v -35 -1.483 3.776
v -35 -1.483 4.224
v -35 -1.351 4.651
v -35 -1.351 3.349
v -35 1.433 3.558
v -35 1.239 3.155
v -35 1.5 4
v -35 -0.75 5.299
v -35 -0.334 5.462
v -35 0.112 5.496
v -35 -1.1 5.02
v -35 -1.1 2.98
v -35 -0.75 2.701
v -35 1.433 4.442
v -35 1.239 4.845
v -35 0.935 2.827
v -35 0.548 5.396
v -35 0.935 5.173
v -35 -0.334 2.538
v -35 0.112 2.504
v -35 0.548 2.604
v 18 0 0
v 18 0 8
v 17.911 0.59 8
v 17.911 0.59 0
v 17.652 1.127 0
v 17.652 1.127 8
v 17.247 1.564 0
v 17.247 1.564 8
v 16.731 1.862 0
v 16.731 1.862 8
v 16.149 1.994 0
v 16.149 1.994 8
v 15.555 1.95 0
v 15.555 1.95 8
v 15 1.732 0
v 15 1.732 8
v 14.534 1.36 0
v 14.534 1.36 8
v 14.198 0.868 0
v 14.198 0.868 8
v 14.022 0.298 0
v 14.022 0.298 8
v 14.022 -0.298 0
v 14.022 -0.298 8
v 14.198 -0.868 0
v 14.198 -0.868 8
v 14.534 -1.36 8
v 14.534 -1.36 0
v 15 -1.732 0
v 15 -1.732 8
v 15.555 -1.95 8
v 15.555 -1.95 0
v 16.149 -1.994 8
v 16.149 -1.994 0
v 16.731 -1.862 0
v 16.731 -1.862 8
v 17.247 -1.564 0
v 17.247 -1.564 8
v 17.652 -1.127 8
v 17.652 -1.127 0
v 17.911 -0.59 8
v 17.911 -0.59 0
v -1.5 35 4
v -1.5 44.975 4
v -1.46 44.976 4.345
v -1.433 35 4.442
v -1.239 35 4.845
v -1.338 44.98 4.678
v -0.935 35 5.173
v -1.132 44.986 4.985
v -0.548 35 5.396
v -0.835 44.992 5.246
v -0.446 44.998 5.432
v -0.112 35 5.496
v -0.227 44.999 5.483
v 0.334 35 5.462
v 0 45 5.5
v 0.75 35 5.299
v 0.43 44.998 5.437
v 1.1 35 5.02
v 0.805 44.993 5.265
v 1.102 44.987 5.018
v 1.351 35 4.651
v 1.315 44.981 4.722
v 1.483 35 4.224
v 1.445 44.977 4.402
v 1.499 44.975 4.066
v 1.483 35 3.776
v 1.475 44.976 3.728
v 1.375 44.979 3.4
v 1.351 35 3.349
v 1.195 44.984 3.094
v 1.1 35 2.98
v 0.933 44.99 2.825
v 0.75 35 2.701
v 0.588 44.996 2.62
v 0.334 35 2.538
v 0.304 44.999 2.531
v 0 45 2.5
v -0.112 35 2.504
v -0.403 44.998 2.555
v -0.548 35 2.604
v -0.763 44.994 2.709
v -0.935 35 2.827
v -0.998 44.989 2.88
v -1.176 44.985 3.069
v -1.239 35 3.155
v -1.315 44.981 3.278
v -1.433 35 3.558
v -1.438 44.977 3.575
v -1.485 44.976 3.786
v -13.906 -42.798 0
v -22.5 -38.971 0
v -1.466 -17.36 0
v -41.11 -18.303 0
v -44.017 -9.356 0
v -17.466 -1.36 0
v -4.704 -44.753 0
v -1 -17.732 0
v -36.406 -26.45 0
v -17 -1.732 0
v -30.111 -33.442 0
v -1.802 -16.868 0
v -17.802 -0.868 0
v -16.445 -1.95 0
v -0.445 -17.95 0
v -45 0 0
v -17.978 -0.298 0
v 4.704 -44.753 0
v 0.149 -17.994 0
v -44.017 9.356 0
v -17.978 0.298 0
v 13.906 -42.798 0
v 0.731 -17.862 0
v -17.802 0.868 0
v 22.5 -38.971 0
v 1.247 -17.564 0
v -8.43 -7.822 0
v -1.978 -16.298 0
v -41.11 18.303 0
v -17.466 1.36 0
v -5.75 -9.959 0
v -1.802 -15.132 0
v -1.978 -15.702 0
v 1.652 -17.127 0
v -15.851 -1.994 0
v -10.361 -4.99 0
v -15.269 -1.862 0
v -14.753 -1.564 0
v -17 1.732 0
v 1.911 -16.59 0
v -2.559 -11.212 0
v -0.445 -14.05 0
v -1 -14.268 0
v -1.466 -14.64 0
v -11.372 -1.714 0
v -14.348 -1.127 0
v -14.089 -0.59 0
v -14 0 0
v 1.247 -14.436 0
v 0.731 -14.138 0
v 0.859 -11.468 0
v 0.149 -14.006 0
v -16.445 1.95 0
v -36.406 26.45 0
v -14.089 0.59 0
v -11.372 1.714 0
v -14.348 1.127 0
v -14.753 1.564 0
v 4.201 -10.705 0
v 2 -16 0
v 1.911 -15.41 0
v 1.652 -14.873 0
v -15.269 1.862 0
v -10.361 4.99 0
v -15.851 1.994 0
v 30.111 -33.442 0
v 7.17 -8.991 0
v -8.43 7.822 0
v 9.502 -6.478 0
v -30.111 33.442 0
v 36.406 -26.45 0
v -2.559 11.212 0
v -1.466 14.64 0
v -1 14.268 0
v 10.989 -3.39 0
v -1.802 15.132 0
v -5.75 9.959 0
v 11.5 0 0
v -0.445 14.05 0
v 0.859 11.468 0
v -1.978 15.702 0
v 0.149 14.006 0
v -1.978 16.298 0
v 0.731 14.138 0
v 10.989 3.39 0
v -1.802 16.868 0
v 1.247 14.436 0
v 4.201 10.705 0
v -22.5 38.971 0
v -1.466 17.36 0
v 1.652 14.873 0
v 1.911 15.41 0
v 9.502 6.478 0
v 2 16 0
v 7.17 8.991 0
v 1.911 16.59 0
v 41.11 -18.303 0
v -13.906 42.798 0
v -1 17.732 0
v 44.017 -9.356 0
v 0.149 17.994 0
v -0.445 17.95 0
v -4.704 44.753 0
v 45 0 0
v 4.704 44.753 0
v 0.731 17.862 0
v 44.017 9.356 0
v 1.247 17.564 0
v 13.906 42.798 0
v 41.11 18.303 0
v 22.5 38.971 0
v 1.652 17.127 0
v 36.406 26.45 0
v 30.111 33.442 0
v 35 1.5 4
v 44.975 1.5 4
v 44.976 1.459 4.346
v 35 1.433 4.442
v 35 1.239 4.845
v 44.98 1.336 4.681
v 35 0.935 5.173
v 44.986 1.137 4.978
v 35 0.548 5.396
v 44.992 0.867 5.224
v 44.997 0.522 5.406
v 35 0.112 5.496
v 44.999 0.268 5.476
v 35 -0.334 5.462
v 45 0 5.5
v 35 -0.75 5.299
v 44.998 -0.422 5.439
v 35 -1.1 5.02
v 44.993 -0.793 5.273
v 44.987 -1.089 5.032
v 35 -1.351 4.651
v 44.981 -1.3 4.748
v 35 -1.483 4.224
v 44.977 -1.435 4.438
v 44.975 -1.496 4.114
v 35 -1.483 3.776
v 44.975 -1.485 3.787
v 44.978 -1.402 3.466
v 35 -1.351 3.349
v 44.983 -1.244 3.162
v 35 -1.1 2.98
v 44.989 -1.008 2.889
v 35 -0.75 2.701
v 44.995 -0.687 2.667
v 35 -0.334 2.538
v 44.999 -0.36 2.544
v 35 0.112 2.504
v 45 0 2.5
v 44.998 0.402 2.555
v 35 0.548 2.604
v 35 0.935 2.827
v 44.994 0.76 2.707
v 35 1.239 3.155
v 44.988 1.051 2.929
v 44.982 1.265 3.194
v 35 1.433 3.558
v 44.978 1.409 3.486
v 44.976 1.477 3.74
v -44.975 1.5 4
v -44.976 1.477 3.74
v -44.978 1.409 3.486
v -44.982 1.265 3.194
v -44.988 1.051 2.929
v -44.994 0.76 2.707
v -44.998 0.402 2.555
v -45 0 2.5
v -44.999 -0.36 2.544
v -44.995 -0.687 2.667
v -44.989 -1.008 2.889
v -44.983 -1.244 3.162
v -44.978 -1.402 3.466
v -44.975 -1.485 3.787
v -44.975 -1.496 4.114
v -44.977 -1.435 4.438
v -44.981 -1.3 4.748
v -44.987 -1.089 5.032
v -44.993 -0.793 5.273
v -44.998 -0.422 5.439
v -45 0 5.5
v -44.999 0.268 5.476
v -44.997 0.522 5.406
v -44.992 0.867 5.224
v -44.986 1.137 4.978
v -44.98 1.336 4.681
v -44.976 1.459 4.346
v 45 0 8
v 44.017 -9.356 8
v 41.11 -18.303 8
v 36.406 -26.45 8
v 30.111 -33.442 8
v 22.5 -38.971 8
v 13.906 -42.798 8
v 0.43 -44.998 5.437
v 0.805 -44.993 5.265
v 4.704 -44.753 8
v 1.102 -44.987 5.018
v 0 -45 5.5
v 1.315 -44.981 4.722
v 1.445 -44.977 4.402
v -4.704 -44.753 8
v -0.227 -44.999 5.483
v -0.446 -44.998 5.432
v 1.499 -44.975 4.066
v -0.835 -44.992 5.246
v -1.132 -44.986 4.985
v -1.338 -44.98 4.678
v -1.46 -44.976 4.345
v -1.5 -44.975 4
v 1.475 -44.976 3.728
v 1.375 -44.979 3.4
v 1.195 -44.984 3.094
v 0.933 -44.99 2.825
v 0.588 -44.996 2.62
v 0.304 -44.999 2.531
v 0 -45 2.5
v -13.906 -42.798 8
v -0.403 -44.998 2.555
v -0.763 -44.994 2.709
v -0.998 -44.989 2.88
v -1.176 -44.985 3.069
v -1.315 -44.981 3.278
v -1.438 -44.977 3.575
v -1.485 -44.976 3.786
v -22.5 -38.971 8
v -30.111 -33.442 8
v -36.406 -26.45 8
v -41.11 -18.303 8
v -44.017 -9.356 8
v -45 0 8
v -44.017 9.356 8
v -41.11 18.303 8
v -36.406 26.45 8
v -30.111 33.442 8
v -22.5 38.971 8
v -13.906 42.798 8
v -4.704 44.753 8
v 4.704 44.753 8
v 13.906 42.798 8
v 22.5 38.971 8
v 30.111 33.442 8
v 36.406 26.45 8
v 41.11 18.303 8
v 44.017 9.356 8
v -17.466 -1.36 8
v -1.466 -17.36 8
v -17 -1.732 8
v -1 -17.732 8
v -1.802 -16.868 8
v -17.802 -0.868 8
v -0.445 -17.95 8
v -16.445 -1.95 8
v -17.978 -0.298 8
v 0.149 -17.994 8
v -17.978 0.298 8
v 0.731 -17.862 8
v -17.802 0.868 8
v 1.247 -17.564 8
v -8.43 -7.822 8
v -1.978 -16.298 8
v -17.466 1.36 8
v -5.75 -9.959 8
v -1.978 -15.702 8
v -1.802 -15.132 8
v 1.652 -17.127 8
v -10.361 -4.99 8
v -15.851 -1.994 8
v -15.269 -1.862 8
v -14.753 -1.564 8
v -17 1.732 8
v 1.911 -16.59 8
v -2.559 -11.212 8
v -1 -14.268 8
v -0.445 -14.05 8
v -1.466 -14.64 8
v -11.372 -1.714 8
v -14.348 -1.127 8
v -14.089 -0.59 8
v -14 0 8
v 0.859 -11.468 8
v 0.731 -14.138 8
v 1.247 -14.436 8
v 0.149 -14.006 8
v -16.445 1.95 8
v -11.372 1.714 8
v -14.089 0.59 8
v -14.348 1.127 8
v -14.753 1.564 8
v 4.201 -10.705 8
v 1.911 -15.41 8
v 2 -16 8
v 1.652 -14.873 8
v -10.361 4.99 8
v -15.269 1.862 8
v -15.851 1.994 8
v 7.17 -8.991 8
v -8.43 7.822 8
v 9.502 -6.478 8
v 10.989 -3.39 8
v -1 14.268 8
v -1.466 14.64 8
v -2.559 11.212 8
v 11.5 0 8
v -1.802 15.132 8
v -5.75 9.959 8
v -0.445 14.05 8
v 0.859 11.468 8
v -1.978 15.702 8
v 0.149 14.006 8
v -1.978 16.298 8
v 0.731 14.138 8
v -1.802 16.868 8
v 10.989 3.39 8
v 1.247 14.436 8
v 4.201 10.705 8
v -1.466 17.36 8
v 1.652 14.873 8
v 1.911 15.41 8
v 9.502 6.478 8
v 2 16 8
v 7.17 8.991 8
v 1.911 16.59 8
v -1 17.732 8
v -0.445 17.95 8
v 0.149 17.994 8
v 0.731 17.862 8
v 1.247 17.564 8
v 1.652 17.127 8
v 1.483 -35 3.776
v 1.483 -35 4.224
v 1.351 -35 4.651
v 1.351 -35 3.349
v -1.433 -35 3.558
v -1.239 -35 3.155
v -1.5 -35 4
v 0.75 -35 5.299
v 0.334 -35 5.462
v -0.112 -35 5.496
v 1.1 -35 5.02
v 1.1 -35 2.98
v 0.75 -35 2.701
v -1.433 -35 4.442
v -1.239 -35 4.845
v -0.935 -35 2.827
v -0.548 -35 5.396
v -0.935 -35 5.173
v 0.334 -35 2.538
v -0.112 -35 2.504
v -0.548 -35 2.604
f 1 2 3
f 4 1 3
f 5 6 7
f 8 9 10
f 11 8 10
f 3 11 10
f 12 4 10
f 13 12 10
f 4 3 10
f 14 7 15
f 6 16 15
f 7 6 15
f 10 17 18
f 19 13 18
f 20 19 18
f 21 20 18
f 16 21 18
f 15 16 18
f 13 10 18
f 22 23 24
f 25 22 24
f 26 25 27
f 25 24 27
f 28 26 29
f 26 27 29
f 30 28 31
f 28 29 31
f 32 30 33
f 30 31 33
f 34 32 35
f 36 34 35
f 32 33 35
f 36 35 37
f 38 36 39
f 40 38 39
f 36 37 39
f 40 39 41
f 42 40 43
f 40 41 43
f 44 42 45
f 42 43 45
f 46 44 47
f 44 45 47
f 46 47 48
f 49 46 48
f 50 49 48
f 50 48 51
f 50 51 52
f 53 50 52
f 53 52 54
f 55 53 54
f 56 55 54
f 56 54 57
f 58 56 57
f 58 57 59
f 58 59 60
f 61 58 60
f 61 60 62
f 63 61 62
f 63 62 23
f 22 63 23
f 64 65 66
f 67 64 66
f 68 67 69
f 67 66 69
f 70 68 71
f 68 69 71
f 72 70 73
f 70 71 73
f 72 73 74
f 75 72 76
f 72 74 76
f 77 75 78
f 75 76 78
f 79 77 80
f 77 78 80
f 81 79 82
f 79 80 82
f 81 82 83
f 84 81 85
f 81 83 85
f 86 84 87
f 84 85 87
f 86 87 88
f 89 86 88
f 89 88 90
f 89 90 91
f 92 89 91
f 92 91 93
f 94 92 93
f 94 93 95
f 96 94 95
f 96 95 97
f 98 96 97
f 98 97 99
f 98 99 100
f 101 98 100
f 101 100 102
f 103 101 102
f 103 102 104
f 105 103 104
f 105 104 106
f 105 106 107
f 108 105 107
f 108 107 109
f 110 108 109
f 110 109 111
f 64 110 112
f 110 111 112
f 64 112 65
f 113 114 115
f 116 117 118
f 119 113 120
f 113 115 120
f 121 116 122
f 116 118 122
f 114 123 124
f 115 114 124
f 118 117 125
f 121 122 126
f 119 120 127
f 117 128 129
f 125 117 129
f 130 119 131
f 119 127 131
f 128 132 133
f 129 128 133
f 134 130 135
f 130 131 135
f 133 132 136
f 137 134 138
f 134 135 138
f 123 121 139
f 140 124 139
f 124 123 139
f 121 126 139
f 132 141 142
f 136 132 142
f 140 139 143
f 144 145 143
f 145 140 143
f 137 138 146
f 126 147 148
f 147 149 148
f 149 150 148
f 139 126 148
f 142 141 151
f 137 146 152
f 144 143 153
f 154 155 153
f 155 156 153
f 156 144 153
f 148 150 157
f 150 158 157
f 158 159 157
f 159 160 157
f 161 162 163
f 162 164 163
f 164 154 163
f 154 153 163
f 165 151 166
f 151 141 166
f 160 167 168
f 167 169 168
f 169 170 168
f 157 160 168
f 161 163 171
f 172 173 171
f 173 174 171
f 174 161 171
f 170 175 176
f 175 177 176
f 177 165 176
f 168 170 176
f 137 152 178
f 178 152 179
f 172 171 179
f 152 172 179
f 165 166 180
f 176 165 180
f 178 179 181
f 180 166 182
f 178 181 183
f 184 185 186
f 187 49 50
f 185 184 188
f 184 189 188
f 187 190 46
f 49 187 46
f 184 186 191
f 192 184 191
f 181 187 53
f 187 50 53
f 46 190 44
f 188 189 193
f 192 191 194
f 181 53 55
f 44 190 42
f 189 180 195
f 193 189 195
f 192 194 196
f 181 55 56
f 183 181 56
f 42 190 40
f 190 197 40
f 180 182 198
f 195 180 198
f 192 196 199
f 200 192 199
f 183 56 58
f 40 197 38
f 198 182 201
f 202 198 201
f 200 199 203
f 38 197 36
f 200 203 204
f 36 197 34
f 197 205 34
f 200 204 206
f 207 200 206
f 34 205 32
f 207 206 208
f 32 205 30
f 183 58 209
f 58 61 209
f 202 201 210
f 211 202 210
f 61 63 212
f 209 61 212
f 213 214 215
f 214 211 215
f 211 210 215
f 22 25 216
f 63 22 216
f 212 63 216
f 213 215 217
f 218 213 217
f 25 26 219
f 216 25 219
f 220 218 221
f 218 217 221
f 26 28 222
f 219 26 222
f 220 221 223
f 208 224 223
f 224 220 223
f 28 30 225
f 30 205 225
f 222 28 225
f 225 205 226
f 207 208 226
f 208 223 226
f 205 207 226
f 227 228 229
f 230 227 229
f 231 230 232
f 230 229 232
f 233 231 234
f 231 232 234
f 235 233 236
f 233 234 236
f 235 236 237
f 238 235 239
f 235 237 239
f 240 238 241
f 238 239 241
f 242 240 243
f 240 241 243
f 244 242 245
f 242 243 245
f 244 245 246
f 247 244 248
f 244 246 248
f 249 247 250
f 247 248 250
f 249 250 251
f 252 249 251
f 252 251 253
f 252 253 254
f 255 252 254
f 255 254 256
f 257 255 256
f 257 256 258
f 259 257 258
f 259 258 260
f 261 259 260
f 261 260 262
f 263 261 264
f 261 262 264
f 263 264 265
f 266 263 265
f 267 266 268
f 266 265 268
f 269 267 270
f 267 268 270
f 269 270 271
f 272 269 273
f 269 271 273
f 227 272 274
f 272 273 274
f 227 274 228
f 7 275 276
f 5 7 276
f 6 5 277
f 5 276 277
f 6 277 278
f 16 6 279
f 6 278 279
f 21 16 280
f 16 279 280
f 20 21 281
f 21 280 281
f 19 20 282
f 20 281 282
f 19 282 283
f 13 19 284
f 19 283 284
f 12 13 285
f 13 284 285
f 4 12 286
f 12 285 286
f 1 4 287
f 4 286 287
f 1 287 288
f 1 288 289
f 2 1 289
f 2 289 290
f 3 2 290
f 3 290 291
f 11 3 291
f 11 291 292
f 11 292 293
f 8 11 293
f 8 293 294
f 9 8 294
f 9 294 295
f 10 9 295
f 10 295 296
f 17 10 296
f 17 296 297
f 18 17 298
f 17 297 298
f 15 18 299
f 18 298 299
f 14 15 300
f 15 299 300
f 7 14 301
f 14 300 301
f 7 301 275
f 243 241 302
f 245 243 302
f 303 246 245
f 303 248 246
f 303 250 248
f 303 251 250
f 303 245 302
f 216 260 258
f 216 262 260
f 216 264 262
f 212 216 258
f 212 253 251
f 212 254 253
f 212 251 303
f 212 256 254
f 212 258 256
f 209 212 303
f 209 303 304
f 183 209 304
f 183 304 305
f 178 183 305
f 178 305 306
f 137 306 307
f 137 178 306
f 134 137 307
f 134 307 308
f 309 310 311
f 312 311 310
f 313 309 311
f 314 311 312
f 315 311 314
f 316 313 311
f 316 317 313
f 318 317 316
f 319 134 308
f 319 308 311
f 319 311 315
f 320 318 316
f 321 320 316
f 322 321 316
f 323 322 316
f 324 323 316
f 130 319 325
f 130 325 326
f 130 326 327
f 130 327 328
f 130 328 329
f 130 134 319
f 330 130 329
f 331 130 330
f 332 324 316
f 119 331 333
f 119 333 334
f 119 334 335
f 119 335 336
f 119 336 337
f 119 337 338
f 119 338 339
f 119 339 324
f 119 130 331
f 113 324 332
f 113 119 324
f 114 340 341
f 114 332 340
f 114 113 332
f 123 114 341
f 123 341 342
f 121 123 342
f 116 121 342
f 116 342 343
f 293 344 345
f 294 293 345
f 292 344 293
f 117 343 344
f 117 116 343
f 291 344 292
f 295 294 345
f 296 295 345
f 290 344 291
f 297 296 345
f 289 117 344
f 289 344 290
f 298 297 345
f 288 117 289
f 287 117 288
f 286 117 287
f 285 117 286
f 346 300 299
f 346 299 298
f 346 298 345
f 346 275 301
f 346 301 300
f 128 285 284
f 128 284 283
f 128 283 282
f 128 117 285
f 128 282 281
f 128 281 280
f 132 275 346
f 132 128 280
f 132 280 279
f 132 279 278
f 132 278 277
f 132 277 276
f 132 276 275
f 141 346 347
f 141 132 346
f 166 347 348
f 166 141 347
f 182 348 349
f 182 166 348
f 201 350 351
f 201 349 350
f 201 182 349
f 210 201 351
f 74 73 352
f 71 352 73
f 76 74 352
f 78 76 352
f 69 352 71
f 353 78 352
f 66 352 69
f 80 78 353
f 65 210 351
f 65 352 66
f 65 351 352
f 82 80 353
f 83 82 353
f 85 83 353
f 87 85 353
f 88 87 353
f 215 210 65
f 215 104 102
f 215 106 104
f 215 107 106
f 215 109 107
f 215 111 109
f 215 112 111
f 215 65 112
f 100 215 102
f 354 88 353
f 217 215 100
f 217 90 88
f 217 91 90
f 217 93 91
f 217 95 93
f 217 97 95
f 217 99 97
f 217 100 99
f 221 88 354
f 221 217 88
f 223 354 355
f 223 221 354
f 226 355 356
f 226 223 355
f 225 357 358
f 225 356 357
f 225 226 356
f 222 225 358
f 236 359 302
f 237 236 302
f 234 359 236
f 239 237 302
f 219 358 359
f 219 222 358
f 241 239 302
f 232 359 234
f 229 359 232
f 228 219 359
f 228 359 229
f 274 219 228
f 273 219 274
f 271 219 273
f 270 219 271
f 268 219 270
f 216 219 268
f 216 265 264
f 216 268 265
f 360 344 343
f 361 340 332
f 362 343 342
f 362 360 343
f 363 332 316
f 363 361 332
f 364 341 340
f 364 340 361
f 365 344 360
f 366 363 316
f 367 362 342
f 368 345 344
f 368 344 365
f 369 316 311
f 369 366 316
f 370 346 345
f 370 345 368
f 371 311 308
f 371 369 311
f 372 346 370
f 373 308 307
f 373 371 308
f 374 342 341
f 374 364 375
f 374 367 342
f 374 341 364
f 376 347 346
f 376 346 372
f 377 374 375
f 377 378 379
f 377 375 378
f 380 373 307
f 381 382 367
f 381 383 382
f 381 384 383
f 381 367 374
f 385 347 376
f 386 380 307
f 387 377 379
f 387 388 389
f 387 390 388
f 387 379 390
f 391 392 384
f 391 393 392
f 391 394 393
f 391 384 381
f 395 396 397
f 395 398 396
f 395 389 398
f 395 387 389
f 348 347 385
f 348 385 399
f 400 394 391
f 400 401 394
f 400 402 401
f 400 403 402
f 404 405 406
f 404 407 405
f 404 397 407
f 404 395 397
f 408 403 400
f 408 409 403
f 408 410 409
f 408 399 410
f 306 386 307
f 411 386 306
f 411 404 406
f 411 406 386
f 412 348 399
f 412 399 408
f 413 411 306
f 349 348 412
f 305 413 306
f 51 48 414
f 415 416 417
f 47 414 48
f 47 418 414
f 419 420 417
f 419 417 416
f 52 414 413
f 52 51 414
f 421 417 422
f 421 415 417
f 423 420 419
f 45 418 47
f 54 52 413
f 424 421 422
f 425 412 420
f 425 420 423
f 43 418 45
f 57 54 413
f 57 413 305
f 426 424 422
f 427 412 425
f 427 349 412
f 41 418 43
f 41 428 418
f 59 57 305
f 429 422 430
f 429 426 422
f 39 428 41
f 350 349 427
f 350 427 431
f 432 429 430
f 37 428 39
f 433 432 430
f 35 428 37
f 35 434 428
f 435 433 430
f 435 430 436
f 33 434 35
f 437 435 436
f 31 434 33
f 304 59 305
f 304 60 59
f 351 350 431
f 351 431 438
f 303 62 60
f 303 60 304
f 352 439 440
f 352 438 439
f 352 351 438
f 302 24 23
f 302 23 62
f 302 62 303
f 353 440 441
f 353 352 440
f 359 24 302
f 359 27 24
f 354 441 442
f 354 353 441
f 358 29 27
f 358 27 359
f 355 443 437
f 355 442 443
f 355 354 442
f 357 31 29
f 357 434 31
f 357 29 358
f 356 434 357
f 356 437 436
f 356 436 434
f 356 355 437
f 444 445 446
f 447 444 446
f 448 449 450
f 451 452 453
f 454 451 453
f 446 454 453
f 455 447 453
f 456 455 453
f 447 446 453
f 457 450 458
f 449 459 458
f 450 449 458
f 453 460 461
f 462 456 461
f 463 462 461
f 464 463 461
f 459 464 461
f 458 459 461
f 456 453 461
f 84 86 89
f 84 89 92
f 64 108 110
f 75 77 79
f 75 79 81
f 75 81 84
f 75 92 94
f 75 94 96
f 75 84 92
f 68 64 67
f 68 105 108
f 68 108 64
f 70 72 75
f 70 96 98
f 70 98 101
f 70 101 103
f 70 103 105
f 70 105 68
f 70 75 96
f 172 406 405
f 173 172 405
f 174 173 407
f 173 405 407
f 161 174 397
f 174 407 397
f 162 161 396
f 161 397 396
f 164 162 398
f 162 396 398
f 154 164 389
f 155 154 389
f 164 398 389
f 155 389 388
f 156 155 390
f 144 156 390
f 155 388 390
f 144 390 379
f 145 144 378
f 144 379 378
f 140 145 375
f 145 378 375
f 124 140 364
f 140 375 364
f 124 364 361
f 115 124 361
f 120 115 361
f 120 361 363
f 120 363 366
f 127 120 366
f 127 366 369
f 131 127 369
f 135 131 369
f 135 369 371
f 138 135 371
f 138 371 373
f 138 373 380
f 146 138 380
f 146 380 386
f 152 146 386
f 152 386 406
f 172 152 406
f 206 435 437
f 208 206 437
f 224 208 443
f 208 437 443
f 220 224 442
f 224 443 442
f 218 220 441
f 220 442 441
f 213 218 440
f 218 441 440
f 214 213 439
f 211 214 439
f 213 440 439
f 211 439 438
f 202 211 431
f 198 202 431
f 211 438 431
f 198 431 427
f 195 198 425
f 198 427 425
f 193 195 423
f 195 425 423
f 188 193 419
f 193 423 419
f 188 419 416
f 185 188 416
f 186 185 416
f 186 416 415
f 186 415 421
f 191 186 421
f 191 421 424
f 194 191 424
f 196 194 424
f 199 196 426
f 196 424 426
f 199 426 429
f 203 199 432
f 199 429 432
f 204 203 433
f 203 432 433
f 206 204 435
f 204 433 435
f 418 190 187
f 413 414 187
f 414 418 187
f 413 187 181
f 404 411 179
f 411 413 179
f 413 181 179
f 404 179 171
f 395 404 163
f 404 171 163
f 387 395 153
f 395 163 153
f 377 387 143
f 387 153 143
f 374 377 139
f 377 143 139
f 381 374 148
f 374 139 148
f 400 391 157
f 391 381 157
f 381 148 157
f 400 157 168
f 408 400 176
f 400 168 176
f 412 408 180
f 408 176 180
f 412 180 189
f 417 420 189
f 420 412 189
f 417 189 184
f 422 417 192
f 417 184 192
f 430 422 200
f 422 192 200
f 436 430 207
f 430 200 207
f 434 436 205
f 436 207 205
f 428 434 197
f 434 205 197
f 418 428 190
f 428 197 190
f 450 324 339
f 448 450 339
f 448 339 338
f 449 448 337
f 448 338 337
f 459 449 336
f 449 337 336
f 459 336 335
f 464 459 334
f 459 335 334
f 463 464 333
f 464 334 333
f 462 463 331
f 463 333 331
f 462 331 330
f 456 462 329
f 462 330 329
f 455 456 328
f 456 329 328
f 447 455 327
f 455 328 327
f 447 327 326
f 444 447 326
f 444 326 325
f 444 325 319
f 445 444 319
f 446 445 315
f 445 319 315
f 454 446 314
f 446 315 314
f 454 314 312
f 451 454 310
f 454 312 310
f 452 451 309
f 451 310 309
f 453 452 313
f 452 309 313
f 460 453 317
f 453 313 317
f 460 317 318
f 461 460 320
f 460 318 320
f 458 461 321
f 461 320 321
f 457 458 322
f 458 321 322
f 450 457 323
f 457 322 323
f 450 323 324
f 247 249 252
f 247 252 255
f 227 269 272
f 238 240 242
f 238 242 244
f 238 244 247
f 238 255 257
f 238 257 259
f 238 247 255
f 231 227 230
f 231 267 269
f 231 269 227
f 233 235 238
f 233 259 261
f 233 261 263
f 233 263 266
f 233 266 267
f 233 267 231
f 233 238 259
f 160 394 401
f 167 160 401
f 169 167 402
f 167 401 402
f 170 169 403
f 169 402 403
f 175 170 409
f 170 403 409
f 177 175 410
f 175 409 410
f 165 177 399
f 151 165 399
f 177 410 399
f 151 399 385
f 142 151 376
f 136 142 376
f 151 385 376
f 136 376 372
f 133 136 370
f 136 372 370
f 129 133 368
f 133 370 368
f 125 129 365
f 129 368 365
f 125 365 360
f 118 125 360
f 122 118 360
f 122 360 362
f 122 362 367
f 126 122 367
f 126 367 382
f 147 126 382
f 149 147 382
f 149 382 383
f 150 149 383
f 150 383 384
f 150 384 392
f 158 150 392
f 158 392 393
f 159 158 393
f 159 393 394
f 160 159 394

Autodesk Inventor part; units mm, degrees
sketch "スケッチ1" plane through (0, 0, 0) normal (0, 0, 1) x (1, 0, 0)
  circle A0 centre (0, 0) radius 45
  circle A1 centre (0, 0) radius 11.5
  dimension "d0" = 90
  dimension "d1" = 23
extrude "押し出し1" add sketch "スケッチ1" along normal blind 8
sketch "スケッチ2" plane through (0, 0, 8) normal (0, 0, 1) x (1, 0, 0)
  line L0 (0, 0) -> (0, 16) construction
  circle A0 centre (0, 16) radius 2
  circle A1 centre (-16, 0) radius 2
  circle A2 centre (0, -16) radius 2
  circle A3 centre (16, 0) radius 2
  dimension "d4" = 16
  dimension "d5" = 4
  dimension "d8" = 360
extrude "押し出し2" cut sketch "スケッチ2" against normal blind 8
ref_plane "作業平面1" through (45, 0, 0) normal (1, 0, 0) x (0, 1, 0)
sketch "スケッチ3" plane through (45, 0, 0) normal (1, 0, 0) x (0, 1, 0)
  line L0 (0, 0) -> (0, 4) construction
  circle A0 centre (0, 4) radius 1.5
  dimension "d13" = 4
  dimension "d14" = 3
extrude "押し出し3" cut sketch "スケッチ3" against normal blind 10
ref_plane "作業平面2" through (-45, 0, 0) normal (1, 0, 0) x (0, 1, 0)
sketch "スケッチ4" plane through (-45, 0, 0) normal (1, 0, 0) x (0, 1, 0)
  line L0 (0, 0) -> (0, 4) construction
  circle A0 centre (0, 4) radius 1.5
  dimension "d20" = 4
  dimension "d21" = 3
extrude "押し出し4" cut sketch "スケッチ4" along normal blind 10
ref_plane "作業平面3" through (0, 45, 0) normal (0, 1, 0) x (-1, 0, 0)
sketch "スケッチ5" plane through (0, 45, 0) normal (0, 1, 0) x (-1, 0, 0)
  line L0 (0, 0) -> (0, 4) construction
  circle A0 centre (0, 4) radius 1.5
  dimension "d25" = 4
  dimension "d26" = 3
extrude "押し出し5" cut sketch "スケッチ5" against normal blind 10
ref_plane "作業平面4" through (0, -45, 0) normal (0, 1, 0) x (-1, 0, 0)
sketch "スケッチ6" plane through (0, -45, 0) normal (0, 1, 0) x (-1, 0, 0)
  line L0 (0, 0) -> (0, 4) construction
  circle A0 centre (0, 4) radius 1.5
  dimension "d30" = 4
  dimension "d31" = 3
extrude "押し出し6" cut sketch "スケッチ6" along normal blind 10
thread "ねじ2" size "M3x0.5" class "6H" standard "ANSI Metric M Profile" full length
thread "ねじ3" size "M3x0.5" class "6H" standard "ANSI Metric M Profile" full length
thread "ねじ4" size "M3x0.5" class "6H" standard "ANSI Metric M Profile" full length
thread "ねじ5" size "M3x0.5" class "6H" standard "ANSI Metric M Profile" full length
thread "ねじ10" size "M4x0.7" class "6H" standard "ANSI Metric M Profile" full length
thread "ねじ11" size "M4x0.7" class "6H" standard "ANSI Metric M Profile" full length
thread "ねじ12" size "M4x0.7" class "6H" standard "ANSI Metric M Profile" full length
thread "ねじ13" size "M4x0.7" class "6H" standard "ANSI Metric M Profile" full length
properties part number "Bottom1"
